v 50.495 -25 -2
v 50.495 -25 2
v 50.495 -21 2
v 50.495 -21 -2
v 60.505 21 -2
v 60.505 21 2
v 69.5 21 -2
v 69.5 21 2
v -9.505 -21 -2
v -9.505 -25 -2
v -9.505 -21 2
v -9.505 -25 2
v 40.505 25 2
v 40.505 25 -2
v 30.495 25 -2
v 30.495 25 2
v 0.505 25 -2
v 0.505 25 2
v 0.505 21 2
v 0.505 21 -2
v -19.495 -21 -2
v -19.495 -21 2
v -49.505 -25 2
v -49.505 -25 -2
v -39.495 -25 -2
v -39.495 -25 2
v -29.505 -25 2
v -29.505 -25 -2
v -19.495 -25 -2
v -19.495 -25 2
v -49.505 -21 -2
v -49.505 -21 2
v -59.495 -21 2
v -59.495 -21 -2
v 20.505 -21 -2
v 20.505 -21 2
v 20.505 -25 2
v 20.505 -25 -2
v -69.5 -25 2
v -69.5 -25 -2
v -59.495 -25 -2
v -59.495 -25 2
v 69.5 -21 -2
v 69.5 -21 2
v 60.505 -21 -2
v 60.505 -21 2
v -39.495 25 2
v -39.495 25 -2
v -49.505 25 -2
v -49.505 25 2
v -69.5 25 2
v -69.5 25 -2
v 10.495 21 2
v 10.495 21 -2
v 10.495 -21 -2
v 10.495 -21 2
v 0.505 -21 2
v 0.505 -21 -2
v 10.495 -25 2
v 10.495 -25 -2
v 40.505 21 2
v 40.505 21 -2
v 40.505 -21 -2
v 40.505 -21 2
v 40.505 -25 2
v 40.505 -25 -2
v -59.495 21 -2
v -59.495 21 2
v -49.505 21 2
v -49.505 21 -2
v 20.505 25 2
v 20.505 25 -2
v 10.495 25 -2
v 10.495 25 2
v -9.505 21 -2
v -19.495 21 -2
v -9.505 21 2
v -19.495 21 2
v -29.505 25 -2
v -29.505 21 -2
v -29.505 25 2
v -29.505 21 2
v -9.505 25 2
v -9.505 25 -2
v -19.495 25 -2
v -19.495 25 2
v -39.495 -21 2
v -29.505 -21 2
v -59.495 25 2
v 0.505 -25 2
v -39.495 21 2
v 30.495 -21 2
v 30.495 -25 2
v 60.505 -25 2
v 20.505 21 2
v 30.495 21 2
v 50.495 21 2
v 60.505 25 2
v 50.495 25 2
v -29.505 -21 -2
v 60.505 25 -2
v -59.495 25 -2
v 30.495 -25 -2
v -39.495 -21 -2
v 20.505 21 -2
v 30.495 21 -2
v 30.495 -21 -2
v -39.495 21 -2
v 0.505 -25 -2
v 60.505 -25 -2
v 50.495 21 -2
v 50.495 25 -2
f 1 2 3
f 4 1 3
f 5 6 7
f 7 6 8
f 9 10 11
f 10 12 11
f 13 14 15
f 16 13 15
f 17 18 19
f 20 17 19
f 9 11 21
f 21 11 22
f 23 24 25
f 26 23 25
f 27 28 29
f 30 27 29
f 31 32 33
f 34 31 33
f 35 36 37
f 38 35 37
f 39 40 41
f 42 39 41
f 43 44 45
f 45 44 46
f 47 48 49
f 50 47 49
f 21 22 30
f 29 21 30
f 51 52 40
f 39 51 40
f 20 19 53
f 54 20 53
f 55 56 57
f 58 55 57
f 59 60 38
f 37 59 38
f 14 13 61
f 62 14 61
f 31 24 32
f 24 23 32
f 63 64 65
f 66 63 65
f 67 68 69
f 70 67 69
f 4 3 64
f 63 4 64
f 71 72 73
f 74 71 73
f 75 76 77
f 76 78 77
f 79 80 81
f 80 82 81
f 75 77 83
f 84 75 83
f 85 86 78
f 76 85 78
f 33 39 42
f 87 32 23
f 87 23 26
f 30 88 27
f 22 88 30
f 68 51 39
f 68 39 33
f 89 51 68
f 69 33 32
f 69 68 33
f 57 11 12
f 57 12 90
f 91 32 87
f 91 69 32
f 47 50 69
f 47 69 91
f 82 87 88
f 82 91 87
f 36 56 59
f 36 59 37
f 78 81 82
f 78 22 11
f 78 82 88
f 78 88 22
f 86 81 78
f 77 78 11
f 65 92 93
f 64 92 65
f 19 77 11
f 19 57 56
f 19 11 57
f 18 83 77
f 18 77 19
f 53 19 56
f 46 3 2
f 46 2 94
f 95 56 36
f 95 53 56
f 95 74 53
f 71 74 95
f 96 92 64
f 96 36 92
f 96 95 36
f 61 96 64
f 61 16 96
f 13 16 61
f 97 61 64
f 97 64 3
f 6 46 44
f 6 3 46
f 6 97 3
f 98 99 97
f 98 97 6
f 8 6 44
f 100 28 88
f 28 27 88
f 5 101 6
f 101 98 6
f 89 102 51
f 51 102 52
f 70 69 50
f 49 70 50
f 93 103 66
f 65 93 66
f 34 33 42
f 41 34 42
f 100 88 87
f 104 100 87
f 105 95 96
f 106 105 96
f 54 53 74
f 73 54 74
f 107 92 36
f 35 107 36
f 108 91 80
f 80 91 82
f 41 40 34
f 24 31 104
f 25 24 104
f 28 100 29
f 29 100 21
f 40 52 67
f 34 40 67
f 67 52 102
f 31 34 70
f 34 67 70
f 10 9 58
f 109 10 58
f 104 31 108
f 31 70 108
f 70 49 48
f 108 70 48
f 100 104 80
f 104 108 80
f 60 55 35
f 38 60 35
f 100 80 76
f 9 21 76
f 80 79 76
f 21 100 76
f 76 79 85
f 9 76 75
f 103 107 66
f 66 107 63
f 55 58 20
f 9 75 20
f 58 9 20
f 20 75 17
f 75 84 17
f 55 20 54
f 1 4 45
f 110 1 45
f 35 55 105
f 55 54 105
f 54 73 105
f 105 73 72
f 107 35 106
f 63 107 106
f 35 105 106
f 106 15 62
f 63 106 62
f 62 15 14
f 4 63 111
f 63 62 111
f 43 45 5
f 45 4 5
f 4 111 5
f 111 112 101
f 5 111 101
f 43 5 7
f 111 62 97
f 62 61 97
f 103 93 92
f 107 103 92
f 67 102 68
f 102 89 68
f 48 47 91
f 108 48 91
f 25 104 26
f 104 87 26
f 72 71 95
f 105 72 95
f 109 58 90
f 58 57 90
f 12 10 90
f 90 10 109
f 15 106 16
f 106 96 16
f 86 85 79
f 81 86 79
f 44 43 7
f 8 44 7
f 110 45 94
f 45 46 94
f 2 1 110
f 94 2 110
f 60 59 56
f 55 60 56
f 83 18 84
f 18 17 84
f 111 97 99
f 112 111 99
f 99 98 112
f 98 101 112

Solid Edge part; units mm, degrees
sketch "Sketch1" plane through (0, 0, 0) normal (0, 0, 1) x (1, 0, 0)
  line L0 (-69.5, -25) -> (69.5, -25)
  line L1 (69.5, -25) -> (69.5, 25)
  line L2 (69.5, 25) -> (-69.5, 25)
  line L3 (-69.5, 25) -> (-69.5, -25)
  dimension "D1" = 50
  dimension "D2" = 139
extrude "Protrusion1" add sketch "Sketch1" along normal mid plane 4
sketch "Sketch2" plane through (0, 0, 2) normal (0, 0, 1) x (1, 0, 0)
  line L0 (-39.495, -25) -> (-29.505, -25)
  line L1 (-29.505, -25) -> (-29.505, -21)
  line L2 (-29.505, -21) -> (-39.495, -21)
  line L3 (-39.495, -21) -> (-39.495, -25)
  line L4 (-19.495, -25) -> (-9.505, -25)
  line L5 (-9.505, -25) -> (-9.505, -21)
  line L6 (-9.505, -21) -> (-19.495, -21)
  line L7 (-19.495, -21) -> (-19.495, -25)
  line L8 (0.505, -25) -> (10.495, -25)
  line L9 (10.495, -25) -> (10.495, -21)
  line L10 (10.495, -21) -> (0.505, -21)
  line L11 (0.505, -21) -> (0.505, -25)
  line L12 (20.505, -25) -> (30.495, -25)
  line L13 (30.495, -25) -> (30.495, -21)
  line L14 (30.495, -21) -> (20.505, -21)
  line L15 (20.505, -21) -> (20.505, -25)
  line L16 (40.505, -25) -> (50.495, -25)
  line L17 (50.495, -25) -> (50.495, -21)
  line L18 (50.495, -21) -> (40.505, -21)
  line L19 (40.505, -21) -> (40.505, -25)
  line L20 (60.505, -25) -> (70.495, -25)
  line L21 (70.495, -25) -> (70.495, -21)
  line L22 (70.495, -21) -> (60.505, -21)
  line L23 (60.505, -21) -> (60.505, -25)
  line L24 (-59.495, -25) -> (-49.505, -25)
  line L25 (-49.505, -25) -> (-49.505, -21)
  line L26 (-49.505, -21) -> (-59.495, -21)
  line L27 (-59.495, -21) -> (-59.495, -25)
  dimension "D1" = 9.99
  dimension "D2" = 9.99
  dimension "D3" = 9.99
  dimension "D4" = 9.99
  dimension "D5" = 9.99
  dimension "D6" = 9.99
  dimension "D7" = 4
  dimension "D8" = 4
  dimension "D9" = 4
  dimension "D10" = 4
  dimension "D11" = 4
  dimension "D12" = 4
  dimension "D13" = 15
  dimension "D14" = 20
  dimension "D15" = 20
  dimension "D16" = 20
  dimension "D17" = 20
  dimension "D18" = 20
  dimension "D19" = 4
  dimension "D20" = 20
  dimension "D21" = 9.99
extrude "Extrusionsausschnitt_1" cut sketch "Sketch2" against normal blind 200
mirror "Mirror1" about plane through (0, 0, 0) normal (0, -1, 0) of "Extrusionsausschnitt_1"
properties material "Holz, Kiefer"
